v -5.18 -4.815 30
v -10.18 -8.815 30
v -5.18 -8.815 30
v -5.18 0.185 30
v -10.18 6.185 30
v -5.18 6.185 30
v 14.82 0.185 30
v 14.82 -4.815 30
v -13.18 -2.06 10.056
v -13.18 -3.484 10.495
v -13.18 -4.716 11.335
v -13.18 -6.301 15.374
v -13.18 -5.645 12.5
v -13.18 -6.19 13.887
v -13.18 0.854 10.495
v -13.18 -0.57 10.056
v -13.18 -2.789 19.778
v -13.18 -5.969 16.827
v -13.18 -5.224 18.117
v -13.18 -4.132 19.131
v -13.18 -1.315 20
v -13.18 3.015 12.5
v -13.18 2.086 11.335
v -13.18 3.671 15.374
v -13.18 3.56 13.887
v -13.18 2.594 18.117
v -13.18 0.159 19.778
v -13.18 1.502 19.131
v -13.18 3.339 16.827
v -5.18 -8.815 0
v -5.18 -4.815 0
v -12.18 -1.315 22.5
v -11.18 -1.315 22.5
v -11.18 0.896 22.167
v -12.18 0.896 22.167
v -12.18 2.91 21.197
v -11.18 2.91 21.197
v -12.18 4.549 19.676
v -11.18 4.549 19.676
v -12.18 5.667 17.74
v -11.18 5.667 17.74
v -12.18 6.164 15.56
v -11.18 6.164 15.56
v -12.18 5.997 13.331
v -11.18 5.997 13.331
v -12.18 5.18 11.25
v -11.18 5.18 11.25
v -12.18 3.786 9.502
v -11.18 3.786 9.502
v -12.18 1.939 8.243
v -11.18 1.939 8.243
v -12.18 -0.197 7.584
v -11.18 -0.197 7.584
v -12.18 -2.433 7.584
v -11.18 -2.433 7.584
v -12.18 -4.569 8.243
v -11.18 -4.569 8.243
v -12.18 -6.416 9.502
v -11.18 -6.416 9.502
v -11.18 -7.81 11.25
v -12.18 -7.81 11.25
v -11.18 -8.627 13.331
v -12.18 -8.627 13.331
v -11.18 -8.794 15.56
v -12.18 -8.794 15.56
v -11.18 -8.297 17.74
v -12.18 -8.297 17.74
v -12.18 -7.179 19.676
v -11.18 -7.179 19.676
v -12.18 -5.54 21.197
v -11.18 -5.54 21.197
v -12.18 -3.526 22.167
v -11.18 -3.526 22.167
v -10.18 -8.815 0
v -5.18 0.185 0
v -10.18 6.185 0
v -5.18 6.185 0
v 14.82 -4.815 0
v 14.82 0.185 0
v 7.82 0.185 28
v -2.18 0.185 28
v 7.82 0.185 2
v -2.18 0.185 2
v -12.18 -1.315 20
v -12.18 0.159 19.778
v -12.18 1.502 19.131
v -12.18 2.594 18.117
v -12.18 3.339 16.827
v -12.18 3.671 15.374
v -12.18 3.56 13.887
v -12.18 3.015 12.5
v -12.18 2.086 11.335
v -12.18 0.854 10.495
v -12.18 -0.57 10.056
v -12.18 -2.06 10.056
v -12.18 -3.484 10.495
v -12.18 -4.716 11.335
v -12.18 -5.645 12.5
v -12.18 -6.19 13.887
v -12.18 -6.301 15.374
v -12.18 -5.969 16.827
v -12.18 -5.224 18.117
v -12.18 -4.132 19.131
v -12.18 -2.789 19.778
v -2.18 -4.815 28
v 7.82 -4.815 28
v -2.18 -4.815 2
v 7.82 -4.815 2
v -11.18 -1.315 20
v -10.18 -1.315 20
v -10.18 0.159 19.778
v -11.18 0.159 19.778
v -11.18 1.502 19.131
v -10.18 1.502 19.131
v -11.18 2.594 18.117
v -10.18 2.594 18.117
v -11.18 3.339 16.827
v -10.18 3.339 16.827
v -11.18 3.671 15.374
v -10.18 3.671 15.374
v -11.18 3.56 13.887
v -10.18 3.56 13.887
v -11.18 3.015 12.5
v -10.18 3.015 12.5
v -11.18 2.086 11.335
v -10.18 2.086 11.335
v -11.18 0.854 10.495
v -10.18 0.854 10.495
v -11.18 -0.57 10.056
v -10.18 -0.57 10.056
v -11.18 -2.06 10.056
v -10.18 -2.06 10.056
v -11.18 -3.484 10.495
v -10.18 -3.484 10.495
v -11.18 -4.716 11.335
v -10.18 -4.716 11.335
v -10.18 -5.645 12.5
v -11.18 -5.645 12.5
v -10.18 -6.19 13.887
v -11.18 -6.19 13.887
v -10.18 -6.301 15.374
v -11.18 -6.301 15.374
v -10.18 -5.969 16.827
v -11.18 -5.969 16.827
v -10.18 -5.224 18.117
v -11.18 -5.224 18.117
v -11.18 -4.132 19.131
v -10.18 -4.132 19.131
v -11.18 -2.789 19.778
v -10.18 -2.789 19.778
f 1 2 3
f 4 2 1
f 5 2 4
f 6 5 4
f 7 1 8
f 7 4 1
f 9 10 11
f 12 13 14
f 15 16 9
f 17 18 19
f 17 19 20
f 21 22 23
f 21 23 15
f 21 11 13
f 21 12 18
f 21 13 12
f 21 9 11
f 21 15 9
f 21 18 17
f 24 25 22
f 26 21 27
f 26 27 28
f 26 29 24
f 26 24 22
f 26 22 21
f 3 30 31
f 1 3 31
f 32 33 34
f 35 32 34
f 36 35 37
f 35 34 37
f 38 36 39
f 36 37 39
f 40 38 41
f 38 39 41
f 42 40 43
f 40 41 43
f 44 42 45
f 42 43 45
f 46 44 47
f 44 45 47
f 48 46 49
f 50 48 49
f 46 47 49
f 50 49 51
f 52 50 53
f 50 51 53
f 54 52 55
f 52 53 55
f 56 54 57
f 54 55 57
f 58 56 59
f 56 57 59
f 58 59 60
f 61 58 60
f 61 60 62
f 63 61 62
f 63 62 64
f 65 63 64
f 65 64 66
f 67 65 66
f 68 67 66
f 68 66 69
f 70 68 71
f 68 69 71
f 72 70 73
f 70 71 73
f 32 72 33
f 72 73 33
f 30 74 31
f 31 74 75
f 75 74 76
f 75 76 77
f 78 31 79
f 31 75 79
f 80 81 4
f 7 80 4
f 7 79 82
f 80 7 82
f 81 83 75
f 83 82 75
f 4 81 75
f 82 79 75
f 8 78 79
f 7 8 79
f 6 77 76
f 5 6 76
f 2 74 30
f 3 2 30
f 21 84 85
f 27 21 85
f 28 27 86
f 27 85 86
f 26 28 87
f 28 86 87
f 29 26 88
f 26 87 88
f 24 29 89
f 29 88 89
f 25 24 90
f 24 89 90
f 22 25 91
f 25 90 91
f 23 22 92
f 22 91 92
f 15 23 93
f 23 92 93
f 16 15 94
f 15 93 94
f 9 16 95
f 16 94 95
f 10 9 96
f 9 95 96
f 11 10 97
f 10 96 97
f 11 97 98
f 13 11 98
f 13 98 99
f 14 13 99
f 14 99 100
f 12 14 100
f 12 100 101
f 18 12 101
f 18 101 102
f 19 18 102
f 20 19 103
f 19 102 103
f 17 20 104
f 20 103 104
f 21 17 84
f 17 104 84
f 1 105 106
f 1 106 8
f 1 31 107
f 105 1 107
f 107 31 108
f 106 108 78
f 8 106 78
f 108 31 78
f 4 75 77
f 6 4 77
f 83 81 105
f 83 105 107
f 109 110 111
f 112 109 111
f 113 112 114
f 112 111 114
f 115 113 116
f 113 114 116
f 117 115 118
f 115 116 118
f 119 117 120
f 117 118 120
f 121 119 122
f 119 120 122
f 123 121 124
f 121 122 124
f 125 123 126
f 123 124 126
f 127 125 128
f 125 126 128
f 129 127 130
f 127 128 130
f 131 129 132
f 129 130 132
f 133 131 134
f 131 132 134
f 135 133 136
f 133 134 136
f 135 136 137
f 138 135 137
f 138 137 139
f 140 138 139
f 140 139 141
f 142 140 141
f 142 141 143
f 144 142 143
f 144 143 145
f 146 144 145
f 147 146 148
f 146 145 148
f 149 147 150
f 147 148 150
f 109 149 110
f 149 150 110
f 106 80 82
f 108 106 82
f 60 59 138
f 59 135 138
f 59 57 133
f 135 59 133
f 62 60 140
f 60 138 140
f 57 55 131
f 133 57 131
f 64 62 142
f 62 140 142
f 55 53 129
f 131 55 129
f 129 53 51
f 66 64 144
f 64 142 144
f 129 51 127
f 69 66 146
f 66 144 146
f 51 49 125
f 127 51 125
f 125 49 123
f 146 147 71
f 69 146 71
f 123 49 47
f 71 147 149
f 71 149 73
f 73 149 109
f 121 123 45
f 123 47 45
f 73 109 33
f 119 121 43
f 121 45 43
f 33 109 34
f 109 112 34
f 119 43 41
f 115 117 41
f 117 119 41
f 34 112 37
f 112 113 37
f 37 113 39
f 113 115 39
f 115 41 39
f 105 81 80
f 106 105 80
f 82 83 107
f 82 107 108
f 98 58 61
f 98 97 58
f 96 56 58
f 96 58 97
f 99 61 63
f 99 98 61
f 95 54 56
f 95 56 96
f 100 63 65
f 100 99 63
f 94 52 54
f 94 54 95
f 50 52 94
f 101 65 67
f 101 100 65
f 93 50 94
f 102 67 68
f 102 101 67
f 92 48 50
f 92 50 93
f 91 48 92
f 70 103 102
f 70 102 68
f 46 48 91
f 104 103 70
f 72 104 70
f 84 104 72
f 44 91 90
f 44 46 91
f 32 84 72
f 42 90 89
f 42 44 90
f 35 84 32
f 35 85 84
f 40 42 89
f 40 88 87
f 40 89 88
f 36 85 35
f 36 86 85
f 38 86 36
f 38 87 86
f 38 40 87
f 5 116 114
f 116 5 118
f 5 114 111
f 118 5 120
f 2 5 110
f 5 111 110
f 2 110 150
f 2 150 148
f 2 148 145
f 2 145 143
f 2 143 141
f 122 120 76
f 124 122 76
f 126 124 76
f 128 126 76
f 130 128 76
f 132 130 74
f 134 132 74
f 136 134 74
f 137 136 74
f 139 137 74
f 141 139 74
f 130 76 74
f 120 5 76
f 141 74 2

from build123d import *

# Parameters (mm, degrees)
BOSS_EXTRUDE1_DEPTH = 30
SKETCH2_W           = 10
SKETCH2_H           = 26
CUT_EXTRUDE1_DEPTH  = 5
SKETCH3_R           = 5
BOSS_EXTRUDE2_DEPTH = 1
SKETCH4_R           = 7.5
BOSS_EXTRUDE3_DEPTH = 1
SKETCH5_R           = 5
BOSS_EXTRUDE4_DEPTH = 1


with BuildPart() as part:
    # Sketch1 → Boss-Extrude1 (new body)
    with BuildSketch(Plane.XY):
        Polygon((-10.17985471, 6.184971098), (-10.17985471, -8.815028902), (-5.17985471, -8.815028902), (-5.17985471, -4.815028902), (14.82014529, -4.815028902), (14.82014529, 0.184971098), (-5.17985471, 0.184971098), (-5.17985471, 6.184971098), align=None)
    extrude(amount=BOSS_EXTRUDE1_DEPTH)

    # Sketch2 → Cut-Extrude1 (cut)
    with BuildSketch(Plane(origin=(0, 0.184971098, 0), x_dir=(1, 0, 0), z_dir=(0, 1, 0))):
        with Locations((2.82014529, -15)):
            Rectangle(SKETCH2_W, SKETCH2_H)
    extrude(amount=-CUT_EXTRUDE1_DEPTH, mode=Mode.SUBTRACT)

    # Sketch3 → Boss-Extrude2 (add)
    with BuildSketch(Plane.ZY.offset(10.17985471)):
        with Locations((15, -1.315028902)):
            Circle(SKETCH3_R)
    extrude(amount=BOSS_EXTRUDE2_DEPTH)

    # Sketch4 → Boss-Extrude3 (add)
    with BuildSketch(Plane.ZY.offset(11.17985471)):
        with Locations((15, -1.315028902)):
            Circle(SKETCH4_R)
    extrude(amount=BOSS_EXTRUDE3_DEPTH)

    # Sketch5 → Boss-Extrude4 (add)
    with BuildSketch(Plane.ZY.offset(12.17985471)):
        with Locations((15, -1.315028902)):
            Circle(SKETCH5_R)
    extrude(amount=BOSS_EXTRUDE4_DEPTH)


solid = part.part
